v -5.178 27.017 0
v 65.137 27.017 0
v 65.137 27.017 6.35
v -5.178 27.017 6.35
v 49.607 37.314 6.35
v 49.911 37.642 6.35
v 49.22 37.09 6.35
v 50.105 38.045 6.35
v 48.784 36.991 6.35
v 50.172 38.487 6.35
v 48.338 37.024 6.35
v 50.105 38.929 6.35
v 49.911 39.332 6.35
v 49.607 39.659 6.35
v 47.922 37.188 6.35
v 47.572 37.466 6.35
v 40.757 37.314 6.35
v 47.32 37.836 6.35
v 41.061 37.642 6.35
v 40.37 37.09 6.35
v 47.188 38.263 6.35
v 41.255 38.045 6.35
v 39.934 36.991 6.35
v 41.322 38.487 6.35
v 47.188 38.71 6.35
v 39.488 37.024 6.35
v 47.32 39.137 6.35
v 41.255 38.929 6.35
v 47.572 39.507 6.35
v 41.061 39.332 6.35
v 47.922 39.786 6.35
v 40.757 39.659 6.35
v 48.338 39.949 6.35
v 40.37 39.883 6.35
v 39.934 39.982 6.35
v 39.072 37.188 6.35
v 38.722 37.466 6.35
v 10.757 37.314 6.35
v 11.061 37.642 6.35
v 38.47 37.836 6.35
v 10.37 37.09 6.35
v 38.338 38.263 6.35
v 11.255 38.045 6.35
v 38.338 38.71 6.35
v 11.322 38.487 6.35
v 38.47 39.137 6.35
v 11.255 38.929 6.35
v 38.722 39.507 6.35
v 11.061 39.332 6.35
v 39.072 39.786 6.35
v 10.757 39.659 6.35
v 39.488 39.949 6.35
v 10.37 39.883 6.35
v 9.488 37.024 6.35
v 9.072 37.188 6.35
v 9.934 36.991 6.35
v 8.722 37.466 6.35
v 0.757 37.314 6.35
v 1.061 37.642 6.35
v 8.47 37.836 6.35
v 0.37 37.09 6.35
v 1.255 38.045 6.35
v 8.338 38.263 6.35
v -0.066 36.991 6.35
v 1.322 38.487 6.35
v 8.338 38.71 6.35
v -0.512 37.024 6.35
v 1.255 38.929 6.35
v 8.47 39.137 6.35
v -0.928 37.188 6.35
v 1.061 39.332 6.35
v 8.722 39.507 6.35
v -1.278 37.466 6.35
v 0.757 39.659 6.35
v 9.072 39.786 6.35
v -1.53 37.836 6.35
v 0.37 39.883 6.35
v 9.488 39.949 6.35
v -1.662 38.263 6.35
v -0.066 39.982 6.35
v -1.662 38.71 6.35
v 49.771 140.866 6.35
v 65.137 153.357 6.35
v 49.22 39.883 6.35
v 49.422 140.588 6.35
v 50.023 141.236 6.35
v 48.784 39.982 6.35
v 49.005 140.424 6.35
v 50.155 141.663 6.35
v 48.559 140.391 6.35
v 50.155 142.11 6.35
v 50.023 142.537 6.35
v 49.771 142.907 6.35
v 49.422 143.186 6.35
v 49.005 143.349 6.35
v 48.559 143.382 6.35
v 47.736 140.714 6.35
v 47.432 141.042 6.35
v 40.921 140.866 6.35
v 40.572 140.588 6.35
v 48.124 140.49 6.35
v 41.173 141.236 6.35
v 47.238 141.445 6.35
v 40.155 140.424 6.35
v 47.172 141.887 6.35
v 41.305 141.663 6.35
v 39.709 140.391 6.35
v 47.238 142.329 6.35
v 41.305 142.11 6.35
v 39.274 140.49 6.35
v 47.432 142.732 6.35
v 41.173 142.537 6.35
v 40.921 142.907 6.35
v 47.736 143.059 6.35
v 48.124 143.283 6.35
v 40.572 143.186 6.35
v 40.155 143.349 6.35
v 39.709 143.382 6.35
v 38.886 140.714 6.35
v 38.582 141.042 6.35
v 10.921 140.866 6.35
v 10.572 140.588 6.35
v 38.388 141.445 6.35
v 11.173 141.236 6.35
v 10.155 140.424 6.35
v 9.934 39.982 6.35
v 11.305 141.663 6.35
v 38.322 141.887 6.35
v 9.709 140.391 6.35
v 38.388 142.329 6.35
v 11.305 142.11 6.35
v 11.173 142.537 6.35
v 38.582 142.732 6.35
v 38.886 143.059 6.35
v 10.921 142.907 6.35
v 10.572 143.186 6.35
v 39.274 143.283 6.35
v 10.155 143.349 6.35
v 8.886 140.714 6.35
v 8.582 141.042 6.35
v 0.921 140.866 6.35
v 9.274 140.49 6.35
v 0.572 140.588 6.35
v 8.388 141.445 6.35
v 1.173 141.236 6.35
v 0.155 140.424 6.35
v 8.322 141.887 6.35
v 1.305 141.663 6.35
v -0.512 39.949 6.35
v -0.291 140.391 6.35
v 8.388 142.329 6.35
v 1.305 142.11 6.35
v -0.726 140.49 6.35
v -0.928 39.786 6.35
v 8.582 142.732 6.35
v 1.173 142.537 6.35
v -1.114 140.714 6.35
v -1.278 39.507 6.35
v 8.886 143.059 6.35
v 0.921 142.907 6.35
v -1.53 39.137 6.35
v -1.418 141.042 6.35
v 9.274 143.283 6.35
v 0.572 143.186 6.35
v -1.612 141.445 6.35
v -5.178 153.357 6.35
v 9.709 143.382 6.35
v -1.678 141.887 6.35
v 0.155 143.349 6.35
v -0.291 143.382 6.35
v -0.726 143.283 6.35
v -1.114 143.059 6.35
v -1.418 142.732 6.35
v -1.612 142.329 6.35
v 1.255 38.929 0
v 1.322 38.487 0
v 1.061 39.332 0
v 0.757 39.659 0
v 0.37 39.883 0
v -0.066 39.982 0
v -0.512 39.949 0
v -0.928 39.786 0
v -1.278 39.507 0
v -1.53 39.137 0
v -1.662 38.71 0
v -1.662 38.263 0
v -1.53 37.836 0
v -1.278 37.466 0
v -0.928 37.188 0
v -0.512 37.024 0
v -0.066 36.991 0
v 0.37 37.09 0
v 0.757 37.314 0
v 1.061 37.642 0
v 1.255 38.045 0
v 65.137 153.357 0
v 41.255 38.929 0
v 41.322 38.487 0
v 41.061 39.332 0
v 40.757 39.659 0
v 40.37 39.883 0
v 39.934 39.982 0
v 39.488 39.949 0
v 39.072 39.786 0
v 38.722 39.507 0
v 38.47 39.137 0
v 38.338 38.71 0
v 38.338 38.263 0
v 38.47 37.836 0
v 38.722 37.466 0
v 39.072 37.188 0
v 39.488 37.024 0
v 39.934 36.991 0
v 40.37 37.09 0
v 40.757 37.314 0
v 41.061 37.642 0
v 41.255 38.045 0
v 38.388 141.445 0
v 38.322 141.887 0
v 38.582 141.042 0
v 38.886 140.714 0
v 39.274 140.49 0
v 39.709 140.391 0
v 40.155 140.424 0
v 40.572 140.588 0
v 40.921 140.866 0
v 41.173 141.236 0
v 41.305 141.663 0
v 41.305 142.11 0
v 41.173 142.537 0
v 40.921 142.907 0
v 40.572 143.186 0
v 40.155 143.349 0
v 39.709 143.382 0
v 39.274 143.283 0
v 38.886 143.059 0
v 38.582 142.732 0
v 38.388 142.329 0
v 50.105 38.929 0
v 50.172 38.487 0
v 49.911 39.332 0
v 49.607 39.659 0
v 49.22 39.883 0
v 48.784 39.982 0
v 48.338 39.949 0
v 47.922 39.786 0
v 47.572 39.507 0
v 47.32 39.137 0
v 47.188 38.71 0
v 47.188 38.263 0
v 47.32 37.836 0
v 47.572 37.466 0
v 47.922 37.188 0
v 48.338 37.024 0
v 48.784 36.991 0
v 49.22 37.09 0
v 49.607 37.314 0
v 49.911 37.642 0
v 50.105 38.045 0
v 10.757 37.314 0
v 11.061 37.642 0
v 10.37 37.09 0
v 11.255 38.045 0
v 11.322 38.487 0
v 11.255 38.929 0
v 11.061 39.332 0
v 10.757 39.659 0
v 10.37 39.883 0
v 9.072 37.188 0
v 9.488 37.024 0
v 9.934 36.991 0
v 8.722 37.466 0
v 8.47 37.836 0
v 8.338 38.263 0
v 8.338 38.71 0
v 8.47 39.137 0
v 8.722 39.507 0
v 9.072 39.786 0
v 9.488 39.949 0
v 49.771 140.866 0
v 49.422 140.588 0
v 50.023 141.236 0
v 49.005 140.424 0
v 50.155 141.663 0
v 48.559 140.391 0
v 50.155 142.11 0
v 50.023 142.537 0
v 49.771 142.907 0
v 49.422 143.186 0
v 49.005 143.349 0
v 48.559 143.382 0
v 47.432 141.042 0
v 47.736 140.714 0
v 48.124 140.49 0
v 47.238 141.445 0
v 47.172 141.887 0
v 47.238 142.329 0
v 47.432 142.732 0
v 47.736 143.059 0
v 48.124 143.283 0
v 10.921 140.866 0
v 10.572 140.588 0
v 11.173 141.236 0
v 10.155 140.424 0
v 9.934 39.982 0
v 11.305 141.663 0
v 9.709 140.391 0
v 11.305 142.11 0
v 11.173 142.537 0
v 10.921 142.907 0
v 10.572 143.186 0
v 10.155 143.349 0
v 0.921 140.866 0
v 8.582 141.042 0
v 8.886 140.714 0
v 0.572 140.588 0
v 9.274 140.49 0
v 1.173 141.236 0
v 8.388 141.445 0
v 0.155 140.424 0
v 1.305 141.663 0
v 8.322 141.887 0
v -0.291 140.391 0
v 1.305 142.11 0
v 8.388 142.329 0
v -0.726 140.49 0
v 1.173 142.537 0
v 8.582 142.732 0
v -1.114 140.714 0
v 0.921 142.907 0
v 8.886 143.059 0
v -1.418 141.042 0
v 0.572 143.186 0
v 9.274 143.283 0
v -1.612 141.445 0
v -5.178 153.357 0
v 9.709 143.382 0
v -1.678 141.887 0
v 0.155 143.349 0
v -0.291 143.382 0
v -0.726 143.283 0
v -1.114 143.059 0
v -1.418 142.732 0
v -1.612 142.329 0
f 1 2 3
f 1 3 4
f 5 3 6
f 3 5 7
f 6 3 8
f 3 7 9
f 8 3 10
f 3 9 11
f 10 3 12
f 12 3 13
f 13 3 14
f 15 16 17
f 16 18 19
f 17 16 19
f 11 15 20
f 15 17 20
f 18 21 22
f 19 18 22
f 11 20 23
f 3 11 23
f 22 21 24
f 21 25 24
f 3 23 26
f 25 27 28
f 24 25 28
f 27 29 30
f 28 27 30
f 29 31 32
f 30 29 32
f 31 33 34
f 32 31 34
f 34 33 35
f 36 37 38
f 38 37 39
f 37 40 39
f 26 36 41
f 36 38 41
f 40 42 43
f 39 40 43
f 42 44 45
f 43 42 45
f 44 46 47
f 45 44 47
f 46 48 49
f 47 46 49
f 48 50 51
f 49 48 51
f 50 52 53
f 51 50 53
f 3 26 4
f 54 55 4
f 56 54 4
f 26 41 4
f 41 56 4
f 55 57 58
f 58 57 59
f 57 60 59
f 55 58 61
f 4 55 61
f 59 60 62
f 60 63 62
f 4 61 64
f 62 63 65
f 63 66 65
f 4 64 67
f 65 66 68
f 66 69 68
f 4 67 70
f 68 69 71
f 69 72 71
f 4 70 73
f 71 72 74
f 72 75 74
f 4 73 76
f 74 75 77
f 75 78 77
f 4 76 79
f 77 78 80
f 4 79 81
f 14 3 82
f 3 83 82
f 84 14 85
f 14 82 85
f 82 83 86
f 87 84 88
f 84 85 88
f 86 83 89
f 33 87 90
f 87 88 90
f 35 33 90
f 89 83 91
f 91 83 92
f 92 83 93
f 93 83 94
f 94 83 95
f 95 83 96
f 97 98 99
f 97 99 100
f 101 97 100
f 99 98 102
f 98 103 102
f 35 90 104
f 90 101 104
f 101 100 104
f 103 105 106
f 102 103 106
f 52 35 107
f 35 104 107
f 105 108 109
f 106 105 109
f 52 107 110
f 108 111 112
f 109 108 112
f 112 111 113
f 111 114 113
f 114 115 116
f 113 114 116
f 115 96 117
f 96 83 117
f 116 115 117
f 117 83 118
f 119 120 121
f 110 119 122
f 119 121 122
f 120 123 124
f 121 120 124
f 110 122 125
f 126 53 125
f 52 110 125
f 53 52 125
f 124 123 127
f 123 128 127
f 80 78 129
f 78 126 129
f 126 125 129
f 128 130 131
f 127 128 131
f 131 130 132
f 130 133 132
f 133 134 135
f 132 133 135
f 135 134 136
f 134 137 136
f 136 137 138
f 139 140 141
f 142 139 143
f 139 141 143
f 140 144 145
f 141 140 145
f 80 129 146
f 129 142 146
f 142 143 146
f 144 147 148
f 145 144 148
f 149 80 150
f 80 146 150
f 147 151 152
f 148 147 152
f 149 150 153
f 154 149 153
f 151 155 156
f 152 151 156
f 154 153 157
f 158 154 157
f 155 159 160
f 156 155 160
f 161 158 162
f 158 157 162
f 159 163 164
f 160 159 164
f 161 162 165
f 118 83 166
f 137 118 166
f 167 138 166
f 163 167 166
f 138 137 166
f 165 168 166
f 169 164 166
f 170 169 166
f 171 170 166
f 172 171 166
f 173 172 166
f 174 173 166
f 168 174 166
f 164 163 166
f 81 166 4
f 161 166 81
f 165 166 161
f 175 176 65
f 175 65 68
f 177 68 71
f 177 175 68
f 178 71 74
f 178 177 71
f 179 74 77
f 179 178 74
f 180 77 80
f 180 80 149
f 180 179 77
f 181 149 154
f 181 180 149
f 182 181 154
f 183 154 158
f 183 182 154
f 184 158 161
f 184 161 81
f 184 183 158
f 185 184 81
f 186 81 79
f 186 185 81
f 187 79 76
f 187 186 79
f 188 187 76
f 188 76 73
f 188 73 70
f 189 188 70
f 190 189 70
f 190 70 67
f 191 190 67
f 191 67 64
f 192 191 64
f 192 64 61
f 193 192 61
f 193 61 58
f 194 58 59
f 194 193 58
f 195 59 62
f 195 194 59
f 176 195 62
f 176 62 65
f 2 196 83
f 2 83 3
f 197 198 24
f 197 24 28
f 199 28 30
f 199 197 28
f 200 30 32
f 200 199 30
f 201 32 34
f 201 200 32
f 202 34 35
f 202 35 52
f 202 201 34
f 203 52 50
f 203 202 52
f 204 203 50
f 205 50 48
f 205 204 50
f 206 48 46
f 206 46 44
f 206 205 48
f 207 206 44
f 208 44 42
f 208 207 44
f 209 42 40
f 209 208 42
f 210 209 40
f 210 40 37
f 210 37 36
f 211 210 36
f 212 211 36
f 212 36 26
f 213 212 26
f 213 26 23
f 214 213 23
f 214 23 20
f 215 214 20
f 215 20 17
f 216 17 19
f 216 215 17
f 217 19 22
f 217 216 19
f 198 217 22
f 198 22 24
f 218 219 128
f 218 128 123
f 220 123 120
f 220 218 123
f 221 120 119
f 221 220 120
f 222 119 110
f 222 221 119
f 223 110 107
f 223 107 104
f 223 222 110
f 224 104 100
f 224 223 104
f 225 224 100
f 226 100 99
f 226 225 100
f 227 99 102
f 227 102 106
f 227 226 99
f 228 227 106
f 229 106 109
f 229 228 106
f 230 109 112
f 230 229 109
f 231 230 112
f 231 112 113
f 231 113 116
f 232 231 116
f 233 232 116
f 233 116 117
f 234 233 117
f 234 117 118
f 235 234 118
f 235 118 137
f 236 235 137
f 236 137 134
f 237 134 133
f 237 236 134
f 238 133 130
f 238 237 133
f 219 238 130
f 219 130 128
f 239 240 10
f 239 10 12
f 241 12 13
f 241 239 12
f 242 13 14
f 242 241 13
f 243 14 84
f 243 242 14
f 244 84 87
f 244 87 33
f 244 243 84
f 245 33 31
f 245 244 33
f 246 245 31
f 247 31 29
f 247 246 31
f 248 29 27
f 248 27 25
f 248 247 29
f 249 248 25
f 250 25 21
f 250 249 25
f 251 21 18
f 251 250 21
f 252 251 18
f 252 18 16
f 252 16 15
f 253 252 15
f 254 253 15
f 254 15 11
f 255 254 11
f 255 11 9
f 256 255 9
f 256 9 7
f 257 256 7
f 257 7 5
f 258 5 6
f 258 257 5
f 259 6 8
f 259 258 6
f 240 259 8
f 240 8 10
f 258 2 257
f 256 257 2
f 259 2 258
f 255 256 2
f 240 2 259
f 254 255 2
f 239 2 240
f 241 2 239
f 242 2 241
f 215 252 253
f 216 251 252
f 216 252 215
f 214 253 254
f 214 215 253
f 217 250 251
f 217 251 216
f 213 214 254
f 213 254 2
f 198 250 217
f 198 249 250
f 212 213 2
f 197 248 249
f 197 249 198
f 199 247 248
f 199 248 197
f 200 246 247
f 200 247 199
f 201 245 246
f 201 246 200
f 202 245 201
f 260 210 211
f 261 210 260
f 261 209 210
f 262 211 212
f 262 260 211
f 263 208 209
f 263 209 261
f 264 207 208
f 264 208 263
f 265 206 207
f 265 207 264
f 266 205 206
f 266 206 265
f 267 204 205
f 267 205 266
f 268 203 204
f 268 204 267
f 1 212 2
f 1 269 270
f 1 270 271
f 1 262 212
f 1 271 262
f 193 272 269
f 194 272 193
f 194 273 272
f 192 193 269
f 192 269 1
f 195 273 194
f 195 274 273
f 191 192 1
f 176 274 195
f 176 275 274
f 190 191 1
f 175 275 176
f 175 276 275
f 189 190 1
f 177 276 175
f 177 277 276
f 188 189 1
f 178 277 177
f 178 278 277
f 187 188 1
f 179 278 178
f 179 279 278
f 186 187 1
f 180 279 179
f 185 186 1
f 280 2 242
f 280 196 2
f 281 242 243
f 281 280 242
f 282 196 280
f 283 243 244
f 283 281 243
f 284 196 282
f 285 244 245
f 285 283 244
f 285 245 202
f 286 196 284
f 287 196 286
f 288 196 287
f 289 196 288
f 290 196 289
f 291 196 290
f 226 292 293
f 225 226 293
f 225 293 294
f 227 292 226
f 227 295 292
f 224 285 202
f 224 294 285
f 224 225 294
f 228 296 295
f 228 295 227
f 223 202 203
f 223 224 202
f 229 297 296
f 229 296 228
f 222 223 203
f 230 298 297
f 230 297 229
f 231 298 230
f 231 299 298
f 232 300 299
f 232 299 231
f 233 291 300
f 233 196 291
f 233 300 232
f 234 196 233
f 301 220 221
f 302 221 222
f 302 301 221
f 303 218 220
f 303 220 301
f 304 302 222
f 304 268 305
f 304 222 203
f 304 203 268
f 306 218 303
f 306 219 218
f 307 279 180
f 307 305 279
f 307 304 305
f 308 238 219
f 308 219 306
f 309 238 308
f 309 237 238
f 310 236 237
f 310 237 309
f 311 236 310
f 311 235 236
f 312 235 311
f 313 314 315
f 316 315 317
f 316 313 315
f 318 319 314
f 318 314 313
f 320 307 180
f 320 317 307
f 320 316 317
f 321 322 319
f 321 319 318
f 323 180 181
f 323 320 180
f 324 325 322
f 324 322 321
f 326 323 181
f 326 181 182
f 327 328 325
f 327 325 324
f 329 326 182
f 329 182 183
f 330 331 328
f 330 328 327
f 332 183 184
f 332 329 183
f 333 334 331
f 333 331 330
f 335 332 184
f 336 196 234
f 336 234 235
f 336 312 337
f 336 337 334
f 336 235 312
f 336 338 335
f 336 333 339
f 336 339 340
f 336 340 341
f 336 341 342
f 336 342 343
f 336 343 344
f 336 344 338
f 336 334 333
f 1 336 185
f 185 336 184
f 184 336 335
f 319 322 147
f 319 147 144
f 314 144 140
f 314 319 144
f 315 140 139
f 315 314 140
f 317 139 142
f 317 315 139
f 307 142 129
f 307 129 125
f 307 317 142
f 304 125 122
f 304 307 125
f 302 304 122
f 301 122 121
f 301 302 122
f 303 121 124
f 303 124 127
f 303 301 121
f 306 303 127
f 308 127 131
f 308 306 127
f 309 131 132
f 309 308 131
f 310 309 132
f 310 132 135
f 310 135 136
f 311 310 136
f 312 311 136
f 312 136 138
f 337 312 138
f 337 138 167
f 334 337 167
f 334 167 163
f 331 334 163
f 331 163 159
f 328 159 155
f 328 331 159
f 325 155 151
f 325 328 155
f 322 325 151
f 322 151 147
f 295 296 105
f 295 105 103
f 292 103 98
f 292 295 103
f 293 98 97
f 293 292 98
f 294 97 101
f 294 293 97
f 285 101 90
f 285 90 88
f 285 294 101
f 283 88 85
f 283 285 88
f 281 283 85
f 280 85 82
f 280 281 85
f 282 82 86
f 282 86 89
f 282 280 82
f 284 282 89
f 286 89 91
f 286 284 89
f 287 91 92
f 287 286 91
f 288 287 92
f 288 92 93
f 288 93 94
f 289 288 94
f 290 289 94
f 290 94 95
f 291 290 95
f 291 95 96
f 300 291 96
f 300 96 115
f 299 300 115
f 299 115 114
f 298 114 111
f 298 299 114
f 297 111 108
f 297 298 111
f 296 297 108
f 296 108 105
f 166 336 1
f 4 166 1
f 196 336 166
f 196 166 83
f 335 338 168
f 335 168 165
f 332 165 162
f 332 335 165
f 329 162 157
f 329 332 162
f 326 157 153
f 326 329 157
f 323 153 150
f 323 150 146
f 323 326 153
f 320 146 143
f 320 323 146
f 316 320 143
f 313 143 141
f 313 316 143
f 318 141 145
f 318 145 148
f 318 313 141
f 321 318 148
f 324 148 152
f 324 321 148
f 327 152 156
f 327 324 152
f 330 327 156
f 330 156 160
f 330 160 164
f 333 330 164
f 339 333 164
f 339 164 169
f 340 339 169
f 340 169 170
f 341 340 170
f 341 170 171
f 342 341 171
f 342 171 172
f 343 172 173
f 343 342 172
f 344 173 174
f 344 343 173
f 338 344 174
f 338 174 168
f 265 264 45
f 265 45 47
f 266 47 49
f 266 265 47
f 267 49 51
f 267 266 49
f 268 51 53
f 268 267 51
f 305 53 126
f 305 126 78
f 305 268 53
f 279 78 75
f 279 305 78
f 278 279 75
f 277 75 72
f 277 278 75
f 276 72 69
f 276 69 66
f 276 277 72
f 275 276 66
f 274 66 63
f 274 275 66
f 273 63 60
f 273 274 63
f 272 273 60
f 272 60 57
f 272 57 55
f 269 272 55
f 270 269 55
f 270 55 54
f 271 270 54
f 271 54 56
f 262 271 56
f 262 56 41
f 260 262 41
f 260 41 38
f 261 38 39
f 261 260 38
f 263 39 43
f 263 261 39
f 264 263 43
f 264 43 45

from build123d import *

# Parameters (mm, degrees)
SKETCH2_R           = 1.5
BOSS_EXTRUDE3_DEPTH = 6.35


with BuildPart() as part:
    # Sketch2 → Boss-Extrude3 (new body)
    with BuildSketch(Plane.XY):
        Polygon((-5.178463077, 27.016673705), (-5.178463077, 43.486673705), (-5.178463077, 136.886673705), (-5.178463077, 153.356673705), (65.137170919, 153.356673705), (65.137170919, 27.016673705), align=None)
        with Locations((39.821536923, 38.486673705)):
            Circle(SKETCH2_R, mode=Mode.SUBTRACT)
        with Locations((9.821536923, 38.486673705)):
            Circle(SKETCH2_R, mode=Mode.SUBTRACT)
        with Locations((-0.178463077, 38.486673705)):
            Circle(SKETCH2_R, mode=Mode.SUBTRACT)
        with Locations((48.671536923, 38.486673705)):
            Circle(SKETCH2_R, mode=Mode.SUBTRACT)
        with Locations(Location((48.671536923, 141.886673705, 0), (0, 0, 180))):
            Circle(SKETCH2_R, mode=Mode.SUBTRACT)
        with Locations(Location((-0.178463077, 141.886673705, 0), (0, 0, 180))):
            Circle(SKETCH2_R, mode=Mode.SUBTRACT)
        with Locations(Location((9.821536923, 141.886673705, 0), (0, 0, 180))):
            Circle(SKETCH2_R, mode=Mode.SUBTRACT)
        with Locations(Location((39.821536923, 141.886673705, 0), (0, 0, 180))):
            Circle(SKETCH2_R, mode=Mode.SUBTRACT)
    extrude(amount=BOSS_EXTRUDE3_DEPTH)


solid = part.part
